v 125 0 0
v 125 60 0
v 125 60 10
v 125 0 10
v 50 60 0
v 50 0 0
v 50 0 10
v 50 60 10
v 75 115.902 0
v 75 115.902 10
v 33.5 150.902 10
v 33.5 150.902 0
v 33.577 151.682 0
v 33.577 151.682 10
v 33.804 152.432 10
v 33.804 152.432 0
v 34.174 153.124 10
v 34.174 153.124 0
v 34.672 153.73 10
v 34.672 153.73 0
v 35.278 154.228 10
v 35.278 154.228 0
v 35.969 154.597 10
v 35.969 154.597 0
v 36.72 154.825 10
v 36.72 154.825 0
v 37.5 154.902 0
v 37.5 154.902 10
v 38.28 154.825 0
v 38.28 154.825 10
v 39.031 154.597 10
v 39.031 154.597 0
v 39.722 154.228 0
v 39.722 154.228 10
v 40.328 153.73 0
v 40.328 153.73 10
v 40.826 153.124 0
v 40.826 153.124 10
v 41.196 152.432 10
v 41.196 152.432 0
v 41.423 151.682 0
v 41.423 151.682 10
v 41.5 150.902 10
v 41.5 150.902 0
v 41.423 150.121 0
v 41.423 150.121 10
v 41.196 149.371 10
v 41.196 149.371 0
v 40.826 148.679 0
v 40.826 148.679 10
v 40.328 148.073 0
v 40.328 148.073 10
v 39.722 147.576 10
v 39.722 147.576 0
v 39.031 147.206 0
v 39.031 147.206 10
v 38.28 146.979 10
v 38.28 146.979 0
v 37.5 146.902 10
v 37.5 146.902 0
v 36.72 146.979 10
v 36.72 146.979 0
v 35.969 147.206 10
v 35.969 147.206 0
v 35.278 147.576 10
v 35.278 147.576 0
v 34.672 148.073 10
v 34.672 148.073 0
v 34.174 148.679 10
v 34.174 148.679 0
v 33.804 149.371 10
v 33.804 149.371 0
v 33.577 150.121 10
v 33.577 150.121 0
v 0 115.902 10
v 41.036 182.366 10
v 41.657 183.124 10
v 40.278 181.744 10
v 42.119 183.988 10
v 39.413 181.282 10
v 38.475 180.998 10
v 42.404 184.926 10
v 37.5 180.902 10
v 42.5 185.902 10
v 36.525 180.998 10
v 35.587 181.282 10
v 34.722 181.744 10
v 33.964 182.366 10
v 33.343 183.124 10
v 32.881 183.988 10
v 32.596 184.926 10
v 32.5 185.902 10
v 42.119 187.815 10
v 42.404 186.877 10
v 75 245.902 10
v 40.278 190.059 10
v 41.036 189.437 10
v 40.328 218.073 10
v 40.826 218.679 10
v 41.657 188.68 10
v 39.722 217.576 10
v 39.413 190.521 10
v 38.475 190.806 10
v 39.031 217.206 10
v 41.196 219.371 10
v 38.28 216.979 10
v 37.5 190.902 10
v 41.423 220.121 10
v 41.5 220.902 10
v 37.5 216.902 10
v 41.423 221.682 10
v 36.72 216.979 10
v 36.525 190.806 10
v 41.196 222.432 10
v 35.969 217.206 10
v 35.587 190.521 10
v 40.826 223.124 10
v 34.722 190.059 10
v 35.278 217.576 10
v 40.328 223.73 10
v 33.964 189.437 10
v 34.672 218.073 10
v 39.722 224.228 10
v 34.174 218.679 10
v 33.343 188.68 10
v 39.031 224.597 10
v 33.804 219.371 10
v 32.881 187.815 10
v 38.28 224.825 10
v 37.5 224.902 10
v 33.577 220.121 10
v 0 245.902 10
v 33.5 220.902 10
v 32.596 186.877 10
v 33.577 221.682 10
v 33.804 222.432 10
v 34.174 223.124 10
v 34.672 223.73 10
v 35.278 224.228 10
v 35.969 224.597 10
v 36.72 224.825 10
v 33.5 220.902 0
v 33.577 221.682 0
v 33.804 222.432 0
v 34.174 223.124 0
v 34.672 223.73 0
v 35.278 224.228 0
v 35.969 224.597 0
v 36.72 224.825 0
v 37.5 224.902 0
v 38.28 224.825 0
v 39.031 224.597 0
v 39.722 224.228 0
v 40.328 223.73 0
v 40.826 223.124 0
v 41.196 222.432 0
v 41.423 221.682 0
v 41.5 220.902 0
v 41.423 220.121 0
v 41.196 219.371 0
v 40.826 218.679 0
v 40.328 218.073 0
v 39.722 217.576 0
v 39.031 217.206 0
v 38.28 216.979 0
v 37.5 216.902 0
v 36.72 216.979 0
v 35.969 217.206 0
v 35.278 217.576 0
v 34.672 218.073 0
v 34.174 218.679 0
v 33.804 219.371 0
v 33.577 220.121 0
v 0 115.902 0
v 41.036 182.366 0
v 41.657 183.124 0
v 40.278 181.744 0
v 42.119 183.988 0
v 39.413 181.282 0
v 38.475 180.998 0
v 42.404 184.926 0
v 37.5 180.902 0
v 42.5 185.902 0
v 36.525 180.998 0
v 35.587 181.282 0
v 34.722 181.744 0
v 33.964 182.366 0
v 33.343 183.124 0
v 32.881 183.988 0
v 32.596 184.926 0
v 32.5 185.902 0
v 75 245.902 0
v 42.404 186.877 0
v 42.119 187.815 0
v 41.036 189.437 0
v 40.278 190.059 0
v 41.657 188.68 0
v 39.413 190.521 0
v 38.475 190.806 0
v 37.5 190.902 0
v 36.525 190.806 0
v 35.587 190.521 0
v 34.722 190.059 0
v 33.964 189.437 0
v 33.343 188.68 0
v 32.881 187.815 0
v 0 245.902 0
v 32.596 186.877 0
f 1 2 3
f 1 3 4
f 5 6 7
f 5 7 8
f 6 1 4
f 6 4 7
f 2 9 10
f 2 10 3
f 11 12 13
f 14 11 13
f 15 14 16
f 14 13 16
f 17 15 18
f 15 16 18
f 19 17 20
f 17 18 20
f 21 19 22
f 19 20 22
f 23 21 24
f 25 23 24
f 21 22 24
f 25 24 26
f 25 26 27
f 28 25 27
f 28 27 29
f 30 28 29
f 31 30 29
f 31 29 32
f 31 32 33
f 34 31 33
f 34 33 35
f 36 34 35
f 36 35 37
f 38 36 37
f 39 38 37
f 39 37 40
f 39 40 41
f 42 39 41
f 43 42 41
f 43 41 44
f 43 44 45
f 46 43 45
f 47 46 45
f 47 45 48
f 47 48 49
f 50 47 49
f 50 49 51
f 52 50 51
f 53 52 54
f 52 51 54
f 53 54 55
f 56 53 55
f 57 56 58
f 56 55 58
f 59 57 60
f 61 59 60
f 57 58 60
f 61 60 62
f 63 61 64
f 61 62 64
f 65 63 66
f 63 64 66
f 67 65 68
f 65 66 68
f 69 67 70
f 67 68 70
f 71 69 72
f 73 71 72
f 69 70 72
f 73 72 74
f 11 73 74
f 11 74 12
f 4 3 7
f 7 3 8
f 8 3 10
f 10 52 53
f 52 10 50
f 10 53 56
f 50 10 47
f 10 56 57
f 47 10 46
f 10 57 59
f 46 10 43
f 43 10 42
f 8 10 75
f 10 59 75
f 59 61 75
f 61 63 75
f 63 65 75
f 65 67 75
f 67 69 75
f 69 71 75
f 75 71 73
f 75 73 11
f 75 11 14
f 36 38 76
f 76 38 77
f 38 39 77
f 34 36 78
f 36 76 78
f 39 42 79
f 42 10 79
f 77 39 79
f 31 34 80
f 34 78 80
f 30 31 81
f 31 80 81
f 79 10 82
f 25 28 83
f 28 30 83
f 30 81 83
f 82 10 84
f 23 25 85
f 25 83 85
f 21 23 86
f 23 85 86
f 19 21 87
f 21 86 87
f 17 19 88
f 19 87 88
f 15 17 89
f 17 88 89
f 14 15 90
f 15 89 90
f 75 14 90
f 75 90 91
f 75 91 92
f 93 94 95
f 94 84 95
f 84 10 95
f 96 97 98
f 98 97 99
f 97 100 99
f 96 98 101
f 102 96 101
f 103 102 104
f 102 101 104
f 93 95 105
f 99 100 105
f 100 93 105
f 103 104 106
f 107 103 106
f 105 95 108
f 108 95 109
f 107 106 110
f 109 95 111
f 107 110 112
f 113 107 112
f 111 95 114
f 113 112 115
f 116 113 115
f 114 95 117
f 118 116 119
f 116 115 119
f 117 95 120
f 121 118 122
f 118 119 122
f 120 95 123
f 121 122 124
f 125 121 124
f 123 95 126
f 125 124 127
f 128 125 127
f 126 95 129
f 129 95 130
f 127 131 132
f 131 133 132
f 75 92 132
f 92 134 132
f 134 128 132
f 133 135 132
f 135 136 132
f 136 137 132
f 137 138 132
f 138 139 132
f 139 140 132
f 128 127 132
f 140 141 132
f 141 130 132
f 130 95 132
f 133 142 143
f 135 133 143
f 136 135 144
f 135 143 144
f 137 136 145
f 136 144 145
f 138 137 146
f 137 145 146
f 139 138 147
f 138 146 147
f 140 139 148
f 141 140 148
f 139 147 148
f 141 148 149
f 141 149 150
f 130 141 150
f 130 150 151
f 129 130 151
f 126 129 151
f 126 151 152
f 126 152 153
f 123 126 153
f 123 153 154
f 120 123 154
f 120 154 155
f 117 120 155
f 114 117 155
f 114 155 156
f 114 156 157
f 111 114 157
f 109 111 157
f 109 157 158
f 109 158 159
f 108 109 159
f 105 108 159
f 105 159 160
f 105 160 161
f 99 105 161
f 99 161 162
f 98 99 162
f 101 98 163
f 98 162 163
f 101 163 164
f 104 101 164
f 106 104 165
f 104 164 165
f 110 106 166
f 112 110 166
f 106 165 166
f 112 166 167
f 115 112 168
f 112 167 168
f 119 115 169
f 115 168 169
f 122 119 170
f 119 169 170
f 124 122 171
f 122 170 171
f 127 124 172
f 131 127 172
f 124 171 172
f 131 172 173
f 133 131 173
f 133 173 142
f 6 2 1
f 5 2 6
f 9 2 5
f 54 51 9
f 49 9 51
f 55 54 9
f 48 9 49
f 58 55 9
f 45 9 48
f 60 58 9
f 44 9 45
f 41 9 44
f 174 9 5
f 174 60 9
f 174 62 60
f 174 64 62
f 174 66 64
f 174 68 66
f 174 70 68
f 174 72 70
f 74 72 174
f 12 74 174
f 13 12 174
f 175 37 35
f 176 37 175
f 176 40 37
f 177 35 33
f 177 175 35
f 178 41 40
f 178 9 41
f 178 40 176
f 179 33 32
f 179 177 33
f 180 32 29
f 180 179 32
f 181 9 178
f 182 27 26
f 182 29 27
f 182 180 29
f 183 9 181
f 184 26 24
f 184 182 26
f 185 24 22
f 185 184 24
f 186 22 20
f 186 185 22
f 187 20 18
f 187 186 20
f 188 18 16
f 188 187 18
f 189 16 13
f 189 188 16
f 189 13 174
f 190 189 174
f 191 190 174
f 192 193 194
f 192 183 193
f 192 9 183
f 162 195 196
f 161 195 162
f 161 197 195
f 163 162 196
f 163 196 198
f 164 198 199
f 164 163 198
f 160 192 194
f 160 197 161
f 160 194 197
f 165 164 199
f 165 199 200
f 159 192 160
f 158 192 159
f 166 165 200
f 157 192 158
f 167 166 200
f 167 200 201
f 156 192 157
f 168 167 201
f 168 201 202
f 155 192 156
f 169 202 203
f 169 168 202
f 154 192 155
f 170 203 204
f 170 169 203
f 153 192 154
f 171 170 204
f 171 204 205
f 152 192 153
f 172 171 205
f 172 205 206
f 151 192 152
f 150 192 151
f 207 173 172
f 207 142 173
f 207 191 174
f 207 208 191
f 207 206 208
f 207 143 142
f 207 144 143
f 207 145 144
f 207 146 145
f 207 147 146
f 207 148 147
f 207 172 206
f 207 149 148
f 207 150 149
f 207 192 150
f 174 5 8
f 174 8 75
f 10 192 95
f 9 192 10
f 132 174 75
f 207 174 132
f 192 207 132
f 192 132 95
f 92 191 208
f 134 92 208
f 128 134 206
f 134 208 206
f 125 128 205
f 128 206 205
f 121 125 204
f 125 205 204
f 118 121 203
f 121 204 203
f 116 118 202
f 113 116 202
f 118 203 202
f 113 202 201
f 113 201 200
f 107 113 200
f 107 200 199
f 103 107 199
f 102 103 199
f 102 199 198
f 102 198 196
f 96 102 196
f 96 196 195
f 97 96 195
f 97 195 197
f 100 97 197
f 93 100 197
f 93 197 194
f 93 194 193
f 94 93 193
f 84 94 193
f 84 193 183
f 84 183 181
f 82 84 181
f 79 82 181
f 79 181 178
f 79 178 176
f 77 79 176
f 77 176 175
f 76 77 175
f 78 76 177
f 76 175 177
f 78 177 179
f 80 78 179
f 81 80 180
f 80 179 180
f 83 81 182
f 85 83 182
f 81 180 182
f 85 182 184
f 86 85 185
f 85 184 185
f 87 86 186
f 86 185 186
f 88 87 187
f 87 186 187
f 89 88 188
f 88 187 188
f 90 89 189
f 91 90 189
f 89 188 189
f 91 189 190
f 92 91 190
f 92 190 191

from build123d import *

# Parameters (mm, degrees)
BOSS_EXTRUDE1_DEPTH    = 10
F_8_0MM_DOWEL_HOLE5_D  = 8
F_10_0MM_DOWEL_HOLE1_D = 10


with BuildPart() as part:
    # Sketch1 → Boss-Extrude1 (new body)
    with BuildSketch(Plane.XY):
        Polygon((0, 245.901699437), (75, 245.901699437), (75, 115.901699437), (125, 60), (125, 0), (50, 0), (50, 60), (0, 115.901699437), align=None)
    extrude(amount=BOSS_EXTRUDE1_DEPTH)

    # Ø8.0mm Dowel Hole5 (through all)
    with Locations(Plane.XY.offset(10)):
        with Locations((37.5, 220.901699437), (37.5, 150.901699437)):
            Hole(F_8_0MM_DOWEL_HOLE5_D / 2)

    # Ø10.0mm Dowel Hole1 (through all)
    with Locations(Plane.XY.offset(10)):
        with Locations((37.5, 185.901699437)):
            Hole(F_10_0MM_DOWEL_HOLE1_D / 2)


solid = part.part
